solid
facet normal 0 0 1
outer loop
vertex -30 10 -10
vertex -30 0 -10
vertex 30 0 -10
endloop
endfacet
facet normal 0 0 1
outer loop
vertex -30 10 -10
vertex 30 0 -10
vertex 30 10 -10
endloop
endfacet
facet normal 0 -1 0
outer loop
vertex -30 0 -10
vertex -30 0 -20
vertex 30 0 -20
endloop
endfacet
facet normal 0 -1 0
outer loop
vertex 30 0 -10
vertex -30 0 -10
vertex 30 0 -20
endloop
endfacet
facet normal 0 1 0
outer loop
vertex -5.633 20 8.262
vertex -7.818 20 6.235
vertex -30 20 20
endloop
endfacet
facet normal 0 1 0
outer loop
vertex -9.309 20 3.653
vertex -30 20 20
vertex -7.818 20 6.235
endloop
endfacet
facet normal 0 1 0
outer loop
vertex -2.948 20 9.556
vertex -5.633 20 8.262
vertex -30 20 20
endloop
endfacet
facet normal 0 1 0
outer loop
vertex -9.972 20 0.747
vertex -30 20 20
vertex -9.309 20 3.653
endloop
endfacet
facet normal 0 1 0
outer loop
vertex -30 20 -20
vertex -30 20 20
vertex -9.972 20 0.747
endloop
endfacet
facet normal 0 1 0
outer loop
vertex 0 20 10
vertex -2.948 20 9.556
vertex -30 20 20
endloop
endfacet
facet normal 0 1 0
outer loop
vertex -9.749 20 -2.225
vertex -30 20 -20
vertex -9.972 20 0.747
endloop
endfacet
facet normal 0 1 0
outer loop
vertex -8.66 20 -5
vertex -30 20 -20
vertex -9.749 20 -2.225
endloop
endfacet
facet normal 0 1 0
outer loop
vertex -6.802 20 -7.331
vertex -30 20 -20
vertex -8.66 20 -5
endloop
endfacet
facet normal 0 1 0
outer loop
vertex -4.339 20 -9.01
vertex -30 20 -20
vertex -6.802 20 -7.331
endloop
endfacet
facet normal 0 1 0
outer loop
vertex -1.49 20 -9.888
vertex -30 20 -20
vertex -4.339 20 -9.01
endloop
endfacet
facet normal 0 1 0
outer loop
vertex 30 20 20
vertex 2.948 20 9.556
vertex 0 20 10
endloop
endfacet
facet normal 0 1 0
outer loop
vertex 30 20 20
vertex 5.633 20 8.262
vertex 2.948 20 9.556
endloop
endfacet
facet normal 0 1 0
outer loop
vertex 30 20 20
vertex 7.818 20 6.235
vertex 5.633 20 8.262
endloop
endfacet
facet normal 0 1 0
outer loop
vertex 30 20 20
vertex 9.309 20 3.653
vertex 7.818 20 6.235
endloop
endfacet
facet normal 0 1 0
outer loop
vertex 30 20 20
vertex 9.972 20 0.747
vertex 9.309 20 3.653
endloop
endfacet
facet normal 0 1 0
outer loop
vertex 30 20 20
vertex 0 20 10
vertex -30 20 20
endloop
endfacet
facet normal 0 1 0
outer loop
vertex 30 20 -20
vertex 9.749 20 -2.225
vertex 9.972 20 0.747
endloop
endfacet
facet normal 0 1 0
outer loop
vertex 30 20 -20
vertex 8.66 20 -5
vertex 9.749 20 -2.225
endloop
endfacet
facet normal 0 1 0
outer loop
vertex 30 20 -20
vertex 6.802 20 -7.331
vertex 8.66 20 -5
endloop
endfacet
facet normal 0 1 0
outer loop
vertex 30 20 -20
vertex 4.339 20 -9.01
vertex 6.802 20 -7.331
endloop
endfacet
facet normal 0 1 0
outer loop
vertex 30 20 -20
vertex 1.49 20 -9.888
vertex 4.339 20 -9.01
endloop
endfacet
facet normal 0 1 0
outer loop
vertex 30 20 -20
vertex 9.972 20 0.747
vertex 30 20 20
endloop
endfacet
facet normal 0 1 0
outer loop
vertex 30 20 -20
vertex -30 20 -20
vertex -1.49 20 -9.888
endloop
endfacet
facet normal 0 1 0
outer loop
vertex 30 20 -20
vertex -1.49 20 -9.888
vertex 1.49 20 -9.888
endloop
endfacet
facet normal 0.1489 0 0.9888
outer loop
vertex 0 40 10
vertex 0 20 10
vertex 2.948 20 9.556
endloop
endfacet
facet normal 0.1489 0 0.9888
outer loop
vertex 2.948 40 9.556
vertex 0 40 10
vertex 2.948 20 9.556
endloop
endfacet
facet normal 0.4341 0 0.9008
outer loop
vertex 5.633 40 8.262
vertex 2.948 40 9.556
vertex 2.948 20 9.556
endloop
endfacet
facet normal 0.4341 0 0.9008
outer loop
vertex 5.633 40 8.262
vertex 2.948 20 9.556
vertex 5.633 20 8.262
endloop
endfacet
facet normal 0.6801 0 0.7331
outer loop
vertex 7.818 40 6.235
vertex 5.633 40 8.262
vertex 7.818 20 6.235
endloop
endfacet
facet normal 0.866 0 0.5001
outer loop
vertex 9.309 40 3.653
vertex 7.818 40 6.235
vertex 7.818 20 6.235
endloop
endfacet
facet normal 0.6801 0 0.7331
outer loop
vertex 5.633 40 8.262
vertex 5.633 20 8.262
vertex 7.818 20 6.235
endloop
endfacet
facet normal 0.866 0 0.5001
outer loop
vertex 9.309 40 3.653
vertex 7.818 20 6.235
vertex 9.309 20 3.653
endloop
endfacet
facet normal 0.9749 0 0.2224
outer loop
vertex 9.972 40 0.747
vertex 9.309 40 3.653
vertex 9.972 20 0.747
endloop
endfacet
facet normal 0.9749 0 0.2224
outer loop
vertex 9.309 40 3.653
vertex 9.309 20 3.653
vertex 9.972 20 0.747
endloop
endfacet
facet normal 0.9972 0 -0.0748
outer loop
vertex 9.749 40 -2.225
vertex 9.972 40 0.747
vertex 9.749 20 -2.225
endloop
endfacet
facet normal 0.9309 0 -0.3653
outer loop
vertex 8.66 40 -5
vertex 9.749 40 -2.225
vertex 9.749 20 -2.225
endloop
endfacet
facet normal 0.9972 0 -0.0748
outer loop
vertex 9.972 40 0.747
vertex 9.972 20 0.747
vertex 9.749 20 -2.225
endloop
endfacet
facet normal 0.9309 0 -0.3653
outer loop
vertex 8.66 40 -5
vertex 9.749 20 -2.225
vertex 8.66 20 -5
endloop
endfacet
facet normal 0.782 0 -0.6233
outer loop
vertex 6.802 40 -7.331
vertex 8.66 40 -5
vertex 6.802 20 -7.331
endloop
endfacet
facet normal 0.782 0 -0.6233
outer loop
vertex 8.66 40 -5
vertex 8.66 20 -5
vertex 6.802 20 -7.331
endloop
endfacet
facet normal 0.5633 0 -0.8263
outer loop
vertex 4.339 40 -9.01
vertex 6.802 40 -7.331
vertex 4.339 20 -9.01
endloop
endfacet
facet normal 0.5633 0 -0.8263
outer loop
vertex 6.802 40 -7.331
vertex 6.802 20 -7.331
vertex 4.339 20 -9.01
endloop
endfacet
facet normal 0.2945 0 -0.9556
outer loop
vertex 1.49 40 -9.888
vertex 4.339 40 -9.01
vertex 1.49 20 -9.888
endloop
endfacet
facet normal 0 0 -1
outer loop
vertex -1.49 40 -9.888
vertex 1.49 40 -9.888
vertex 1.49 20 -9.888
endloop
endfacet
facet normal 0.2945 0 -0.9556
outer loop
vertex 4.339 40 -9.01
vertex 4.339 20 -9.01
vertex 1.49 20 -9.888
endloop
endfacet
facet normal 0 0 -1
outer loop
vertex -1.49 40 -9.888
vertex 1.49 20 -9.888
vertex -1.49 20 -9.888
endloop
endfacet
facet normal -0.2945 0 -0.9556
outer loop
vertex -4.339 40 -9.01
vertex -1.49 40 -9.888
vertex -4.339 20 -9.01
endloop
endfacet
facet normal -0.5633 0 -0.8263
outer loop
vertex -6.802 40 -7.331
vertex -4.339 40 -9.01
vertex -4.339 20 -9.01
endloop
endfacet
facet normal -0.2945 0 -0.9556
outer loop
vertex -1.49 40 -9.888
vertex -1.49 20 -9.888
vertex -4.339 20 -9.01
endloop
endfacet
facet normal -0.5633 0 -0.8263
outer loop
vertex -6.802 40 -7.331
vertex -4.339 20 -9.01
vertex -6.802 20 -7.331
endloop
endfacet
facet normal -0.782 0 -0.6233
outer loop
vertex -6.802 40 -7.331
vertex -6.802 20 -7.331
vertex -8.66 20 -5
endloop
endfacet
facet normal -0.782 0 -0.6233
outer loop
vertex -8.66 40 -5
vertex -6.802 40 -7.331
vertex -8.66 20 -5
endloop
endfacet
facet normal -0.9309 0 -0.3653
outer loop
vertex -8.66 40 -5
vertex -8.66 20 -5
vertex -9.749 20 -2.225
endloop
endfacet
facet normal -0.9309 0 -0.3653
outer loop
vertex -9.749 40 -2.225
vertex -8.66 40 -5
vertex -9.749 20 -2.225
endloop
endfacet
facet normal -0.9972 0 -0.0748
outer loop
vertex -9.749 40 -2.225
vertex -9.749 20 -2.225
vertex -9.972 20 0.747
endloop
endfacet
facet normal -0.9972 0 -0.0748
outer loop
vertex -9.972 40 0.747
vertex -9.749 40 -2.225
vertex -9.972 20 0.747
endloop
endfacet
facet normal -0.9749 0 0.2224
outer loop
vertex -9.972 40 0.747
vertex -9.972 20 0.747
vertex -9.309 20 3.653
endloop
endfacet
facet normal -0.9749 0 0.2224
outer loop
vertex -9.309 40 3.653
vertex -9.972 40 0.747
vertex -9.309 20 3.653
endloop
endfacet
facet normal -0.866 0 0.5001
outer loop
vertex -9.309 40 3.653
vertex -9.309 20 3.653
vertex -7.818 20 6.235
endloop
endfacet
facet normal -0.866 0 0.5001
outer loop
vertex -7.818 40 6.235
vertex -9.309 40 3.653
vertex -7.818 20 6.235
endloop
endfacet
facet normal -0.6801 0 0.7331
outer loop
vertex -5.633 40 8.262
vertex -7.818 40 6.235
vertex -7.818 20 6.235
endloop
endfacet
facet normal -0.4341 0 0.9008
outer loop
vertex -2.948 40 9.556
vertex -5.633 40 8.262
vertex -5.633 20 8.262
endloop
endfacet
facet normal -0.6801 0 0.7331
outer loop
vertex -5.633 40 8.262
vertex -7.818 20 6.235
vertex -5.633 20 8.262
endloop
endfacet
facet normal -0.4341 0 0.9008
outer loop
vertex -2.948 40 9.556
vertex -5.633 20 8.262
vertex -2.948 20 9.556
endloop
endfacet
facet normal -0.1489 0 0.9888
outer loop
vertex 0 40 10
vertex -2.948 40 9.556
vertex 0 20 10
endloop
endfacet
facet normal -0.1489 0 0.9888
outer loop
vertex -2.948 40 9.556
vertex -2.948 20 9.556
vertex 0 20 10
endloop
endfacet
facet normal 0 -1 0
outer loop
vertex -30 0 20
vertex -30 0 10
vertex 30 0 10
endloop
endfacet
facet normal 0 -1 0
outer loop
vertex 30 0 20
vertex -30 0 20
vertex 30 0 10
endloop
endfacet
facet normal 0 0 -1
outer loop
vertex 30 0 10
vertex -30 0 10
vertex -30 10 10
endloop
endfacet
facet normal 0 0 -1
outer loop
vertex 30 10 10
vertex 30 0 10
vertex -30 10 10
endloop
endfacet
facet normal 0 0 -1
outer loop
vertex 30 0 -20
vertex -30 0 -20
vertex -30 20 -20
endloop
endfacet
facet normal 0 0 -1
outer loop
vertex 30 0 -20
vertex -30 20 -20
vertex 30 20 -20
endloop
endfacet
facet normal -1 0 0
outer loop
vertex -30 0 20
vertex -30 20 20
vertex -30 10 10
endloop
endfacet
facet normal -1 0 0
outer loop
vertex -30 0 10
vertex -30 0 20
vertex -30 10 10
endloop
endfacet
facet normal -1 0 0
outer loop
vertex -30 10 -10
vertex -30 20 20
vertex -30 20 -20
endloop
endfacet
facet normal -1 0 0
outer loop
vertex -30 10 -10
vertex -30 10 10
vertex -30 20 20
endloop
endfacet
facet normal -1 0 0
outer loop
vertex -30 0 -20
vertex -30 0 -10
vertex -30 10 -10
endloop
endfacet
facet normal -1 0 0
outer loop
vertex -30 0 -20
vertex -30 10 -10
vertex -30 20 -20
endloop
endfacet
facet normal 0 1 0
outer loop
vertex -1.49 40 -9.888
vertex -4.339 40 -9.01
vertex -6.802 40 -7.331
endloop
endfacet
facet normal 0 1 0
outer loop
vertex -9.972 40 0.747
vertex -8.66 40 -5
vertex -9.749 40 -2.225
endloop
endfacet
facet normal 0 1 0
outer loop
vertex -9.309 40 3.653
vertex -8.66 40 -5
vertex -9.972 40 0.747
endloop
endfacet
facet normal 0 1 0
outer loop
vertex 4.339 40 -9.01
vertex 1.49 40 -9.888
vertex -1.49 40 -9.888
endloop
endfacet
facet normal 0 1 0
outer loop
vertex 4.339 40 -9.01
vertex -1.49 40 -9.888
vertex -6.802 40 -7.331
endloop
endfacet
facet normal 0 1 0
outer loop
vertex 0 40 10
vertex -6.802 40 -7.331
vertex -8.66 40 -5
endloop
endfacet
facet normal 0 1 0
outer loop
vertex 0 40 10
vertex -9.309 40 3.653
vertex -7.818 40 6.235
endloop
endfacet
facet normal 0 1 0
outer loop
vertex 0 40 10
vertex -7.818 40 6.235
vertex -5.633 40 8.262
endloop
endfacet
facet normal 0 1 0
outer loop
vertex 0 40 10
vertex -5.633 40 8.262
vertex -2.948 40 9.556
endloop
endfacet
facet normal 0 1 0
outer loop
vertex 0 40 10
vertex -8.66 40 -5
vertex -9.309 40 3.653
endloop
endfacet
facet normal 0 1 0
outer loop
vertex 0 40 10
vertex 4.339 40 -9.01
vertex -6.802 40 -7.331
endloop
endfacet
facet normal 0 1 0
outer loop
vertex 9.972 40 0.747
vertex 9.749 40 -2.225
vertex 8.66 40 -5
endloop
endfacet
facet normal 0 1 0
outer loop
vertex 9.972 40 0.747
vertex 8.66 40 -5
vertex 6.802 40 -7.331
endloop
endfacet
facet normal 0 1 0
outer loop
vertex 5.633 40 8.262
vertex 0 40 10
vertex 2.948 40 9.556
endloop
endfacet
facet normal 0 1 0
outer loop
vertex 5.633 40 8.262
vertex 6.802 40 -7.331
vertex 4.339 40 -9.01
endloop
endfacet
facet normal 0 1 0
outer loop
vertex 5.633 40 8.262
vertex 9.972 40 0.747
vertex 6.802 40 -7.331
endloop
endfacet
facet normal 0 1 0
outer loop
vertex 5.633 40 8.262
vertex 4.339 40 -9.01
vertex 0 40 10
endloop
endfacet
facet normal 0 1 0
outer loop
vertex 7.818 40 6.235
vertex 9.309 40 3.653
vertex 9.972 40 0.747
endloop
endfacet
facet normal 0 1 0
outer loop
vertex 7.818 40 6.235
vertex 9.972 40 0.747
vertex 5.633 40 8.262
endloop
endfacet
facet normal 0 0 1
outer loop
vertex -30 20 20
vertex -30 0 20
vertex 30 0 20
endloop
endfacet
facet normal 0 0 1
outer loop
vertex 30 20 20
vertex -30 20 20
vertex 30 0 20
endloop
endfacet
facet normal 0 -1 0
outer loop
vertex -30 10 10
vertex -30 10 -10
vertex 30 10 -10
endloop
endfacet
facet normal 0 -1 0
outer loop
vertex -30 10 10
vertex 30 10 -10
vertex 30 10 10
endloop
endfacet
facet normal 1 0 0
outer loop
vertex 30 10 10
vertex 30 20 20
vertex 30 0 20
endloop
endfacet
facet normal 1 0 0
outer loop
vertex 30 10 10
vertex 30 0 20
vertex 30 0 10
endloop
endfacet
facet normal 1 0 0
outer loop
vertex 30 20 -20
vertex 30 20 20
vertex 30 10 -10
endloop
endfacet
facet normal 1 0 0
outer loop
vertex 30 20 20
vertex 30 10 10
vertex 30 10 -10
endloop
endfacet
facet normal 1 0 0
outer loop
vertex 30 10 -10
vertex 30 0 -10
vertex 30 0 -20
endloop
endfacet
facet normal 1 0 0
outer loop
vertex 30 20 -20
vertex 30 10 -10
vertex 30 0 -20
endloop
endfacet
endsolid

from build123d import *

# Parameters (mm, degrees)
SKETCH1_W           = 60
SKETCH1_H           = 40
BOSS_EXTRUDE1_DEPTH = 20
SKETCH2_R           = 10
BOSS_EXTRUDE2_DEPTH = 20
SKETCH4_W           = 20
SKETCH4_H           = 10
CUT_EXTRUDE1_DEPTH  = 75.833147735


with BuildPart() as part:
    # Sketch1 → Boss-Extrude1 (new body)
    with BuildSketch(Plane(origin=(0, 0, 0), x_dir=(1, 0, 0), z_dir=(0, 1, 0))):
        Rectangle(SKETCH1_W, SKETCH1_H)
    extrude(amount=BOSS_EXTRUDE1_DEPTH)

    # Sketch2 → Boss-Extrude2 (add)
    with BuildSketch(Plane(origin=(0, 20, 0), x_dir=(1, 0, 0), z_dir=(0, 1, 0))):
        with Locations(Location((0, 0, 0), (0, 0, 270))):
            Circle(SKETCH2_R)
    extrude(amount=BOSS_EXTRUDE2_DEPTH)

    # Sketch4 → Cut-Extrude1 (cut, through all)
    with BuildSketch(Plane.ZY.offset(30)):
        with Locations((0, 5)):
            Rectangle(SKETCH4_W, SKETCH4_H)
    extrude(amount=-CUT_EXTRUDE1_DEPTH, mode=Mode.SUBTRACT)


solid = part.part
